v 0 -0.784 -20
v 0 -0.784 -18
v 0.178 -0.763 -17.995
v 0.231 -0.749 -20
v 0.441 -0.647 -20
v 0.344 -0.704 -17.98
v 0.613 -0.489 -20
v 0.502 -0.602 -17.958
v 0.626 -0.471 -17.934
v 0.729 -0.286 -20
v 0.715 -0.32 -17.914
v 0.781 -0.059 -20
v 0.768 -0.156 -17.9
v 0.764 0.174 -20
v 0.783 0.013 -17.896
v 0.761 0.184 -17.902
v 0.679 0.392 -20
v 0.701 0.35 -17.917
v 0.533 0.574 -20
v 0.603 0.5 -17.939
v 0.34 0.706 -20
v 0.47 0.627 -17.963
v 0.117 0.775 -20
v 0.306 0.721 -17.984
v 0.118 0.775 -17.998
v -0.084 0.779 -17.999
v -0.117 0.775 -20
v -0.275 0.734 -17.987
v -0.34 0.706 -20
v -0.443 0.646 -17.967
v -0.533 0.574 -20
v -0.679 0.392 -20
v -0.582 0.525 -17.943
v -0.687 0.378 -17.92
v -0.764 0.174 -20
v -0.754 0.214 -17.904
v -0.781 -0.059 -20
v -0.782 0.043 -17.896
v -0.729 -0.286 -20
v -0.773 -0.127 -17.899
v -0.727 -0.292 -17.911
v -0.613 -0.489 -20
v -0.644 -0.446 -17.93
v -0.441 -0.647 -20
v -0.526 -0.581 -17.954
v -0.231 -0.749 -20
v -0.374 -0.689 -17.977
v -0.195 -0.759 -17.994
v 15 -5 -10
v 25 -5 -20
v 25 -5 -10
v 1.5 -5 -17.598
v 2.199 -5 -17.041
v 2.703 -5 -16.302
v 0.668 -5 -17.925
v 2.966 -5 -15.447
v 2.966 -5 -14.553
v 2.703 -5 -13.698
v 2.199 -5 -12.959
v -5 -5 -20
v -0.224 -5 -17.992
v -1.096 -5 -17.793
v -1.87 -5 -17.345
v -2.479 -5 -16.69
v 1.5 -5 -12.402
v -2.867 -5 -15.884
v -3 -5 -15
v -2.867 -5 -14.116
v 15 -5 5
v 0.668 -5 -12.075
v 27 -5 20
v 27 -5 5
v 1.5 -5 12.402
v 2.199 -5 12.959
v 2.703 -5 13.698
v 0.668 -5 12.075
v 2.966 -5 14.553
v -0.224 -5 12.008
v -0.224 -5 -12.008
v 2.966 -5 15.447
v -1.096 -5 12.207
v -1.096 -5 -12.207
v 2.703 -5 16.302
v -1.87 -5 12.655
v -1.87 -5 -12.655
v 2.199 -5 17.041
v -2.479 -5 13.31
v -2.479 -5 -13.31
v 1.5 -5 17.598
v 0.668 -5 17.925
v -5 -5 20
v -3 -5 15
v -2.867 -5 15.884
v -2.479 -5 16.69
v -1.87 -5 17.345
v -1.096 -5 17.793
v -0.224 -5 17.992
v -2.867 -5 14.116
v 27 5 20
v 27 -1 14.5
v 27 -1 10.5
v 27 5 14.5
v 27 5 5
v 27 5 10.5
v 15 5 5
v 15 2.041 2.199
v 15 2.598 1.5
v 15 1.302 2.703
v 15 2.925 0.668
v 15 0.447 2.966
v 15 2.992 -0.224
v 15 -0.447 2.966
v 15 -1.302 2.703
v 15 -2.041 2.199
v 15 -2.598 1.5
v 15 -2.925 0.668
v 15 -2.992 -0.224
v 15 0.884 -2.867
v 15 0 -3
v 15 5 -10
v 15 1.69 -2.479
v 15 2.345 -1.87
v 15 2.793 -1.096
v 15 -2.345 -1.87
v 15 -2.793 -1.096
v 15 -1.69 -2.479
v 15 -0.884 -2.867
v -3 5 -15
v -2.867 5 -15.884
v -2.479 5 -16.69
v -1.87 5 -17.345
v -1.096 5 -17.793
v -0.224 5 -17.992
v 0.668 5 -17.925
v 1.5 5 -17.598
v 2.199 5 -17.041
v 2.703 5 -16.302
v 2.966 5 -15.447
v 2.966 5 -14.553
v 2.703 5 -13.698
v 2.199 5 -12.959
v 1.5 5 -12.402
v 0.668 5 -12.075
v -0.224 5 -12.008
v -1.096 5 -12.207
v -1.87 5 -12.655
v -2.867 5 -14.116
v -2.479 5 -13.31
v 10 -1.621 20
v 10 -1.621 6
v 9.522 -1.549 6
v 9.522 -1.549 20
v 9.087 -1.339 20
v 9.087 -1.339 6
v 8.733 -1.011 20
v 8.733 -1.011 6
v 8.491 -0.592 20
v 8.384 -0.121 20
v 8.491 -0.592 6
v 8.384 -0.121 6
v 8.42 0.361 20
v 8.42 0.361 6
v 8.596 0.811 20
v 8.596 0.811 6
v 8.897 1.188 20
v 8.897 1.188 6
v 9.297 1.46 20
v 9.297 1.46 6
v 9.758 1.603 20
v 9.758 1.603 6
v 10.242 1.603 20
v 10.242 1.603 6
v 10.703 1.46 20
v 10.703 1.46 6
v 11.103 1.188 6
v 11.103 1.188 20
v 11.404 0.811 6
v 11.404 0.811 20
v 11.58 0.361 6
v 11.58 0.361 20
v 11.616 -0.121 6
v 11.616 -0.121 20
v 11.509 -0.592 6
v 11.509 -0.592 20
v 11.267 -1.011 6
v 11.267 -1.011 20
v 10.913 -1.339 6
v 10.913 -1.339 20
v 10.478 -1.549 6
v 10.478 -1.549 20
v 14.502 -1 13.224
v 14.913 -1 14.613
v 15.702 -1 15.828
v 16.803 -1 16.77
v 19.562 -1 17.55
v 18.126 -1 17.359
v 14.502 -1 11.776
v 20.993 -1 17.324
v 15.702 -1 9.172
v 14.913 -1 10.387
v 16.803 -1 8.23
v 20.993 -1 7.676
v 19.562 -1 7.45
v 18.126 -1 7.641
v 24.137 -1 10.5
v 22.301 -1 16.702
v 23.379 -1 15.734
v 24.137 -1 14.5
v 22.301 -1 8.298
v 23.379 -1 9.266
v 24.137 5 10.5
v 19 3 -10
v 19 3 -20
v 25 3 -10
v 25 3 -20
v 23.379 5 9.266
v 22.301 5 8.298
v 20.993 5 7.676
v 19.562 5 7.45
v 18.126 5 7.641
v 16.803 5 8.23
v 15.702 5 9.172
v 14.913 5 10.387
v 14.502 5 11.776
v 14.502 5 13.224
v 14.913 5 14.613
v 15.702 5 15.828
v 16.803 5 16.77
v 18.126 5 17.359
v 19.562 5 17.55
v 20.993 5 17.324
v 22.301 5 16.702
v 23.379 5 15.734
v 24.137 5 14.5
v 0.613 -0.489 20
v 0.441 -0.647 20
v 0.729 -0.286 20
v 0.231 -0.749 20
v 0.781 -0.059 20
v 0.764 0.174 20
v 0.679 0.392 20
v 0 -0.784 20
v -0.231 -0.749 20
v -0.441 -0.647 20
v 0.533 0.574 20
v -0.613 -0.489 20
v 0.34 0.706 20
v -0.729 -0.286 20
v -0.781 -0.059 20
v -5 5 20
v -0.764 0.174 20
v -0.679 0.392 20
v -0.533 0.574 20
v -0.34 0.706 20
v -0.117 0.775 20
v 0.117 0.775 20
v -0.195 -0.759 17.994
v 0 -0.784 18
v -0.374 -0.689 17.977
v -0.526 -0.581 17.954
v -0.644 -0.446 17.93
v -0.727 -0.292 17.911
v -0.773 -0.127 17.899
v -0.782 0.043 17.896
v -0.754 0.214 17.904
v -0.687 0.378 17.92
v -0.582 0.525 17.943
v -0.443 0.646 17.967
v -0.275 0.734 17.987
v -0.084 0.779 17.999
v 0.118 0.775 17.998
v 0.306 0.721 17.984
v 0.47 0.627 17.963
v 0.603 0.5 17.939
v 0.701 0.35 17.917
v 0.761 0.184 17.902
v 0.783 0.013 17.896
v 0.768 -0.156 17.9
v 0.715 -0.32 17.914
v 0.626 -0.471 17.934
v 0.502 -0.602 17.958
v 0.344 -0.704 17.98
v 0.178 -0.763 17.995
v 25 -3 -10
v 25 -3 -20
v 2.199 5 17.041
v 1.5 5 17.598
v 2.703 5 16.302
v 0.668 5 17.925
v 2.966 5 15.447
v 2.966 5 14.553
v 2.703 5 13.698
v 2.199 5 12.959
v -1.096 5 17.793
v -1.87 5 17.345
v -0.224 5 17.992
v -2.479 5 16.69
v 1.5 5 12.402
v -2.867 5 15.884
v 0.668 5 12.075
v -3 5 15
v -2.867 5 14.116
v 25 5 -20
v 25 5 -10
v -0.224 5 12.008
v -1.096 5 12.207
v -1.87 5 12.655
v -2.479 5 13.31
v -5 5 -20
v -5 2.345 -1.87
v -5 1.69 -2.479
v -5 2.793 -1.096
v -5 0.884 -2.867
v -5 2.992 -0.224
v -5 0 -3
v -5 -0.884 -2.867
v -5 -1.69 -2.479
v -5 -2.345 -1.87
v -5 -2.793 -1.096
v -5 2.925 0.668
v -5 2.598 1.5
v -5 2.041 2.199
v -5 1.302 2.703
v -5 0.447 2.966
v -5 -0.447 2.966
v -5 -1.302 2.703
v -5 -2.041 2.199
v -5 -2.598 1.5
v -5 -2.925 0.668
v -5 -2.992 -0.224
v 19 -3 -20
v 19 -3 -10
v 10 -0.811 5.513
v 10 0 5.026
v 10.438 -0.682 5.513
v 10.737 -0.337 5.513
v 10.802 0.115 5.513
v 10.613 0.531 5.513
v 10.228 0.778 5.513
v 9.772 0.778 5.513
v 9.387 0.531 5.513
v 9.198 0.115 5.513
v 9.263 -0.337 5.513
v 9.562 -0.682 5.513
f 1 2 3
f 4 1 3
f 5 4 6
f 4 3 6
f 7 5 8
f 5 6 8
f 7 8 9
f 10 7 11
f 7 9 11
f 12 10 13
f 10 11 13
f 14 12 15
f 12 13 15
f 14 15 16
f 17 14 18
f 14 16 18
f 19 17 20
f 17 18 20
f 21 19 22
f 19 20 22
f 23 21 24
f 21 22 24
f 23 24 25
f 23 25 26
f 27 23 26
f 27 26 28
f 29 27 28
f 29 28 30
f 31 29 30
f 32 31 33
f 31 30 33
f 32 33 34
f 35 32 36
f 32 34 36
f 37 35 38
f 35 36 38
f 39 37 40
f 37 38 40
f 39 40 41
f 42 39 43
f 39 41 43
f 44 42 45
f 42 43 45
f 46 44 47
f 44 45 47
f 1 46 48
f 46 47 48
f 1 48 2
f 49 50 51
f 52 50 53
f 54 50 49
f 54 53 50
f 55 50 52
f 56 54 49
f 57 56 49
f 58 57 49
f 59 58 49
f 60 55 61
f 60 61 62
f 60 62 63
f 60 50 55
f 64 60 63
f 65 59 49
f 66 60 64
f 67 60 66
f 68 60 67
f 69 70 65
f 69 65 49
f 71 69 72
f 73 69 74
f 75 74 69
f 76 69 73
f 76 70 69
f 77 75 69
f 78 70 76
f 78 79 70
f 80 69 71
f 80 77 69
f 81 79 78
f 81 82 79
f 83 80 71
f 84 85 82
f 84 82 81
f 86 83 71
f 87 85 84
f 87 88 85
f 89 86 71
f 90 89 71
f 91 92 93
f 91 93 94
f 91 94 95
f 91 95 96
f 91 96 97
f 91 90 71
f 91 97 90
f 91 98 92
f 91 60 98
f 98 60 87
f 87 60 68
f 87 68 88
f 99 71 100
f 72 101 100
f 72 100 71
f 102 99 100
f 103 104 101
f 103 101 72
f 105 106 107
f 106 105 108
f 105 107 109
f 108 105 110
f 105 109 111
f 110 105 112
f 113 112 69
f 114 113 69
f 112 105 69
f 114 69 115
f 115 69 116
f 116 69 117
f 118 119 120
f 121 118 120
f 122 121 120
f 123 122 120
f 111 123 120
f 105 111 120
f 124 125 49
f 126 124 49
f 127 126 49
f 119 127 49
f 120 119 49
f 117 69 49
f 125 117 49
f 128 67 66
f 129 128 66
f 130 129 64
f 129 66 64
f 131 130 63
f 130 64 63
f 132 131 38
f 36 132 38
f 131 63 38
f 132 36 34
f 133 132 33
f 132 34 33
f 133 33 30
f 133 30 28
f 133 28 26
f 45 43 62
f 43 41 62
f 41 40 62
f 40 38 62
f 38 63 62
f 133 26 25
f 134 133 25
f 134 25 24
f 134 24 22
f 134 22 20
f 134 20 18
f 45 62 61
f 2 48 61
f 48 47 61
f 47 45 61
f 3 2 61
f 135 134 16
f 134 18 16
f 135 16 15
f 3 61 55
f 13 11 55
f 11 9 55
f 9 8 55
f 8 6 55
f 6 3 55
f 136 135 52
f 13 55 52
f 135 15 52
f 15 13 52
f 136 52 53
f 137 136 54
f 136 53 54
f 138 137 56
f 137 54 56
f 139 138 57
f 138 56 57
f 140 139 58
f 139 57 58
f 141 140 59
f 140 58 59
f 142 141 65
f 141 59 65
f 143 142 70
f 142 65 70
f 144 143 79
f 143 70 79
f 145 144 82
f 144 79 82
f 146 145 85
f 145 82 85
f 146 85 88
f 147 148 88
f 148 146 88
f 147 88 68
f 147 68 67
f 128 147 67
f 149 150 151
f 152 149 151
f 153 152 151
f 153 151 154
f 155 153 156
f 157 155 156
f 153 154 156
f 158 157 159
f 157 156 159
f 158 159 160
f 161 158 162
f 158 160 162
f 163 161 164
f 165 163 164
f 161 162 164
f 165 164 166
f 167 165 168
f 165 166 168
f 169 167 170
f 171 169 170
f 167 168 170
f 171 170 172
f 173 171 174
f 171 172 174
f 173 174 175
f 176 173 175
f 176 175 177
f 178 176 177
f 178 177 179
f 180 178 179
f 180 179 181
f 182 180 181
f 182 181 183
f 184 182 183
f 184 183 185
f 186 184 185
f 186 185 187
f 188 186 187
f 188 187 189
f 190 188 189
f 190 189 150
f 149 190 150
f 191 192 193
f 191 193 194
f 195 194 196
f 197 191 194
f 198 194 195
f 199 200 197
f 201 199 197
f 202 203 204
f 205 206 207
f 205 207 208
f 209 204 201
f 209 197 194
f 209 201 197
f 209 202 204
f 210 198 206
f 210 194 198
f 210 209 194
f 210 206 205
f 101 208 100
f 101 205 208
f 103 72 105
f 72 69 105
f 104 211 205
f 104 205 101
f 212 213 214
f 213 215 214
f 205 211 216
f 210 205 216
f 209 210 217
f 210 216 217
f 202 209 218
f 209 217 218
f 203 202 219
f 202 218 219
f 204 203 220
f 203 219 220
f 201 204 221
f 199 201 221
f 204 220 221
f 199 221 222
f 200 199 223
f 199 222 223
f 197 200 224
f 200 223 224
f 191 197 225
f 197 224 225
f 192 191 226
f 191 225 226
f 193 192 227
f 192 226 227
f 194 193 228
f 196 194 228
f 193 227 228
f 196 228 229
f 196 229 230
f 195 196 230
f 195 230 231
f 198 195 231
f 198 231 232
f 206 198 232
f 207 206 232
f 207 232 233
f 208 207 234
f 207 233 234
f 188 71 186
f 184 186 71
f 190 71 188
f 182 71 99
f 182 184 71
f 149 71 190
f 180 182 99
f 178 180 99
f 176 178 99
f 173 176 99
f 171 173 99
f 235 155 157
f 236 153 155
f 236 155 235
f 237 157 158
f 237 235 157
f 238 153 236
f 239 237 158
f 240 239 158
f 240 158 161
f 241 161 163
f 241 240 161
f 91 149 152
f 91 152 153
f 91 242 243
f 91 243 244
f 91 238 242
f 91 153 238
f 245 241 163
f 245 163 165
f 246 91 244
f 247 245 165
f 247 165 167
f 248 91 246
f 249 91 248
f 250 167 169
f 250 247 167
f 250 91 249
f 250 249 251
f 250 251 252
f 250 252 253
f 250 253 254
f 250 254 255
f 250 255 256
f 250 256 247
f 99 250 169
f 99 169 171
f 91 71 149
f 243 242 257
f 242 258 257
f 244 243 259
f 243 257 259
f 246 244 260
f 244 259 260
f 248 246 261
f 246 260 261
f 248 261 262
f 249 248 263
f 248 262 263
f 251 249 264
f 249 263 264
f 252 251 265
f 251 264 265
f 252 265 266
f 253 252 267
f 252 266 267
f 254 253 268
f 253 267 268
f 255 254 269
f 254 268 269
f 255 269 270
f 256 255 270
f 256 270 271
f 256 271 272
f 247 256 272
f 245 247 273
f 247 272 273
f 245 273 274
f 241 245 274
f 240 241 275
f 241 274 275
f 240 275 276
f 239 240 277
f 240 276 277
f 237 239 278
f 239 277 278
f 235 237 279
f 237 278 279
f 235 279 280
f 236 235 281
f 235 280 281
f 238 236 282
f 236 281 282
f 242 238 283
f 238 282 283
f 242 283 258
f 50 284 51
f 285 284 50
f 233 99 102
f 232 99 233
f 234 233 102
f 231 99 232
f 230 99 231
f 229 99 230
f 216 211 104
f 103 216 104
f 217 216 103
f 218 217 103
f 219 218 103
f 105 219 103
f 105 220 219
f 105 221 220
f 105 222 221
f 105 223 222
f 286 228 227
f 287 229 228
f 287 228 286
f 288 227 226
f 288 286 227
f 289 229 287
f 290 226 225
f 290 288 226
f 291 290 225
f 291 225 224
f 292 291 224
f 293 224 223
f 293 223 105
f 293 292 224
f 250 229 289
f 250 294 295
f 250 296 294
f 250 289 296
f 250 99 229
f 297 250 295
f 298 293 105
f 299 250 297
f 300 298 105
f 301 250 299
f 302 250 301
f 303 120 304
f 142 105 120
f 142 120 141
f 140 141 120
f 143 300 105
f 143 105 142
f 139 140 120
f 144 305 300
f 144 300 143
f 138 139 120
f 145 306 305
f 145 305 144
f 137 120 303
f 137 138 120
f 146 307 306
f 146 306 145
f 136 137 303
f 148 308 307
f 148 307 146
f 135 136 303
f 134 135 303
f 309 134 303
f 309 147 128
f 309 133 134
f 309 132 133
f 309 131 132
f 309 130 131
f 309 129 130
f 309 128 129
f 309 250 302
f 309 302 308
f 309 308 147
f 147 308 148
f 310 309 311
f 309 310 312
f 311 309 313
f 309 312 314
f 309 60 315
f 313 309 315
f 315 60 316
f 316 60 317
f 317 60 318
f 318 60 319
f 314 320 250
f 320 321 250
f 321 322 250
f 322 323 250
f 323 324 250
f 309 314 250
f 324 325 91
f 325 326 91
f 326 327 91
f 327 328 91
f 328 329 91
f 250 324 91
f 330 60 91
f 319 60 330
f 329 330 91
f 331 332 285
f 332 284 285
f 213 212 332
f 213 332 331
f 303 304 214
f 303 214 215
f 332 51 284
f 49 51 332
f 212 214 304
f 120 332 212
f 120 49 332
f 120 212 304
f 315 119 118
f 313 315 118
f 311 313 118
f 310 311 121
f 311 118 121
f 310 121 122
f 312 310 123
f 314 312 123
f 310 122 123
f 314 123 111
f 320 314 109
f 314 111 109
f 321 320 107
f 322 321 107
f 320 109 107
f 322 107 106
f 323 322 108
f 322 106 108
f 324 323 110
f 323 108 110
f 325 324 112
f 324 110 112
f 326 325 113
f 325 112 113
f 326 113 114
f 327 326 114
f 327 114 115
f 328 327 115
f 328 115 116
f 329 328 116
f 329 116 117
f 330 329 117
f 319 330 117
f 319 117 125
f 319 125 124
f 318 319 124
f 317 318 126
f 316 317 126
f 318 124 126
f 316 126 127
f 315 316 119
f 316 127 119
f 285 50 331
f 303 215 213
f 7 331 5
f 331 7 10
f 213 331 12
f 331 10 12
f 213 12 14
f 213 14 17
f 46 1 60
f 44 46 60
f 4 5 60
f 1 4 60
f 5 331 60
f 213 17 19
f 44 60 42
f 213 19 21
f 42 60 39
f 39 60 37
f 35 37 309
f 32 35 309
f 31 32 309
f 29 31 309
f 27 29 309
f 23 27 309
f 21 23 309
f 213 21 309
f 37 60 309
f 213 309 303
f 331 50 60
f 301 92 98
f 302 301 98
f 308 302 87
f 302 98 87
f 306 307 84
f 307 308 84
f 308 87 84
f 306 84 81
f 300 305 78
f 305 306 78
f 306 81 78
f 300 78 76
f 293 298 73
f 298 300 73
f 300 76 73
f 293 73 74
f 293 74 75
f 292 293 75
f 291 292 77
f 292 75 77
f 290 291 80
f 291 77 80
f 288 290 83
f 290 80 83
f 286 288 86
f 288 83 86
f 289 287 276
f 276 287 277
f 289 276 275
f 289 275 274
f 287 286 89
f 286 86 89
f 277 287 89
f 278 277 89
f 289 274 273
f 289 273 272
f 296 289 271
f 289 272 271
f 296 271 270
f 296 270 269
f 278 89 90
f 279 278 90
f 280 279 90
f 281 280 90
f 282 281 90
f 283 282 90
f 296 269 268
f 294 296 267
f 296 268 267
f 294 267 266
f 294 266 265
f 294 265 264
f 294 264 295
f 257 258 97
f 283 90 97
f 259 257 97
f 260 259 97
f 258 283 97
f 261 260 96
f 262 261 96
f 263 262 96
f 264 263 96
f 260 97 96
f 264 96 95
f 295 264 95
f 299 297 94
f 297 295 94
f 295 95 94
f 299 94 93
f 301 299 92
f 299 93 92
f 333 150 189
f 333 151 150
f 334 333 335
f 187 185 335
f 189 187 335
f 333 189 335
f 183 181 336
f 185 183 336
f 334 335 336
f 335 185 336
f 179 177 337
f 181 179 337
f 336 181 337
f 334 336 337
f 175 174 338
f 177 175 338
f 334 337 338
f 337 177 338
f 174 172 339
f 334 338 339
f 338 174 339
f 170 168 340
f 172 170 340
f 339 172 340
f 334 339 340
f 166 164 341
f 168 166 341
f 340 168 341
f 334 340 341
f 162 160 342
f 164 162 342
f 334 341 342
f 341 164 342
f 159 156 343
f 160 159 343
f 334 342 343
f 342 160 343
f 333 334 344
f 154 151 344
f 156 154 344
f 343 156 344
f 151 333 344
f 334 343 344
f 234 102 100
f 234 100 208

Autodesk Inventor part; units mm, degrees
ref_plane "YZ Plane" through (0, 0, 0) normal (1, 0, 0) x (0, 1, 0)
ref_plane "XZ Plane" through (0, 0, 0) normal (0, 1, 0) x (-1, 0, 0)
ref_plane "XY Plane" through (0, 0, 0) normal (0, 0, 1) x (1, 0, 0)
sketch "Skizze1" plane through (0, 0, 0) normal (0, 1, 0) x (-1, 0, 0)
  line L0 (5, 20) -> (-15, 20)
  line L1 (-15, 20) -> (-15, -20)
  line L2 (-15, -20) -> (5, -20)
  line L3 (5, -20) -> (5, 20)
  line L4 (0, 15) -> (0, -15) construction
  line L5 (5, 0) -> (0, 0) construction
  circle A0 centre (0, -15) radius 3
  circle A1 centre (0, 15) radius 3
  dimension "d0" = 30
  dimension "d1" = 40
  dimension "d2" = 6
  dimension "d5" = 5
  dimension "d6" = 15
extrude "Extrusion1" add sketch "Skizze1" along normal mid plane 10
sketch "Skizze2" plane through (15, -5, -20) normal (1, 0, 0) x (0, 0, -1)
  circle A0 centre (-20, 5) radius 3
  dimension "d7" = 6
extrude "Extrusion2" cut sketch "Skizze2" against normal through all
sketch "Skizze3" plane through (-5, 5, 20) normal (0, 0, 1) x (1, 0, 0)
  line L0 (20, -10) -> (20, 0) projected
  line L1 (20, -5) -> (15, -5) construction
  point P0 (5, -5)
  dimension "d10" = 5
hole "Bohrung1" at (10, 0, 20) direction (0, 0, -1) diameter 3.242 depth 14 tip angle 118 thread size "M4x0.7" class "6H" standard "ISO Metric profile"
sketch "Skizze4" plane through (-5, 5, 20) normal (0, 0, 1) x (1, 0, 0)
  point P0 (5, -5)
hole "Bohrung2" at (0, 0, 20) direction (0, 0, -1) diameter 1.567 depth 6.3 tip angle 118 thread size "M2x0.4" class "6H" standard "ISO Metric profile"
mirror "Spiegeln2" about plane through (0, 0, 0) normal (0, 0, 1) of "Bohrung2"
sketch "Skizze5" plane through (15, -5, -20) normal (1, 0, 0) x (0, 0, -1)
  circle A0 centre (-20, 5) radius 3 projected
  line L0 (0, 0) -> (0, 10) projected
  line L1 (-40, 10) -> (0, 10) projected
  line L2 (-40, 0) -> (-40, 10) projected
  line L3 (0, 0) -> (-40, 0) projected
  line L4 (-40, 0) -> (-40, 10) projected
  line L5 (-40, 10) -> (0, 10) projected
  line L6 (-40, 0) -> (-25, 0)
  line L7 (-25, 0) -> (-25, 10)
  line L8 (-25, 10) -> (-40, 10)
  line L9 (-40, 10) -> (-40, 0)
  dimension "d25" = 15
extrude "Extrusion3" add sketch "Skizze5" along normal blind 12 contours L3 L2 L1 L7
sketch "Skizze6" plane through (0, 5, 0) normal (0, 1, 0) x (1, 0, 0)
  circle A0 centre (0, -15) radius 3 projected
  circle A1 centre (0, 15) radius 3 projected
  line L0 (-5, -20) -> (27, -20) projected
  line L1 (27, -5) -> (27, -20) projected
  line L2 (15, -5) -> (27, -5) projected
  line L3 (15, -5) -> (15, 20) projected
  line L4 (15, 20) -> (-5, 20) projected
  line L5 (-5, 20) -> (-5, -20) projected
  line L6 (15, -5) -> (15, 20) construction
  circle A2 centre (19.5, -12.5) radius 5.05
  line L7 (27, -5) -> (27, -20) projected
  line L8 (27, -12.5) -> (19.5, -12.5) construction
  line L9 (25.2991, -5) -> (25.2991, -12.5) construction
  point P0 (0, 0)
  dimension "d28" = 10.1
extrude "Extrusion4" cut sketch "Skizze6" against normal blind 6 contours A2
sketch "Skizze7" plane through (0, 5, 0) normal (0, 1, 0) x (1, 0, 0)
  circle A0 centre (19.5, -12.5) radius 5.05 projected
  circle A1 centre (0, -15) radius 3 projected
  circle A2 centre (0, 15) radius 3 projected
  line L0 (-5, -20) -> (27, -20) projected
  line L1 (27, -5) -> (27, -20) projected
  line L2 (15, -5) -> (27, -5) projected
  line L3 (15, -5) -> (15, 20) projected
  line L4 (15, 20) -> (-5, 20) projected
  line L5 (-5, 20) -> (-5, -20) projected
  line L6 (27, -5) -> (27, -20) projected
  line L7 (27, -14.5) -> (17.9872, -14.5)
  line L8 (17.9872, -14.5) -> (17.9872, -10.5)
  line L9 (17.9872, -10.5) -> (27, -10.5)
  line L10 (27, -10.5) -> (27, -14.5)
  point P0 (0, 0)
  point P1 (27, -12.5)
  dimension "d37" = 4
sketch "Skizze8" plane through (15, -5, -20) normal (1, 0, 0) x (0, 0, -1)
  line L0 (-25, 10) -> (-25, 0) projected
  line L1 (0, 0) -> (-25, 0) projected
  line L2 (0, 0) -> (0, 10) projected
  line L3 (-25, 10) -> (0, 10) projected
  circle A0 centre (-20, 5) radius 3 projected
  line L4 (0, 0) -> (-10, 0)
  line L5 (-10, 0) -> (-10, 10)
  line L6 (-10, 10) -> (0, 10)
  line L7 (0, 10) -> (0, 0)
  dimension "d31" = 10
extrude "Extrusion5" add sketch "Skizze8" along normal blind 10 contours L3 L2 L1 L5
sketch "Skizze9" plane through (25, -5, -20) normal (1, 0, 0) x (0, 0, -1)
  line L0 (0, 0) -> (0, 10) projected
  line L1 (0, 10) -> (-10, 10) projected
  line L2 (-10, 10) -> (-10, 0) projected
  line L3 (-10, 0) -> (0, 0) projected
  line L4 (-10, 2) -> (0, 2)
  line L5 (0, 2) -> (0, 8)
  line L6 (0, 8) -> (-10, 8)
  line L7 (-10, 8) -> (-10, 2)
  point P0 (-20, 5)
  point P1 (0, 5)
  dimension "d34" = 6
extrude "Extrusion6" cut sketch "Skizze9" against normal blind 6 contours L4 L2 L6 L0
extrude "Extrusion7" cut sketch "Skizze7" against normal up to surface (6 mm away) contours A0 L7 L8 L9 | A0 L9 L1 L7 picked at (20.1748, -12.5)
properties part number "Probenkammer Halter Plus-Seite" material "Aluminium 6061"
